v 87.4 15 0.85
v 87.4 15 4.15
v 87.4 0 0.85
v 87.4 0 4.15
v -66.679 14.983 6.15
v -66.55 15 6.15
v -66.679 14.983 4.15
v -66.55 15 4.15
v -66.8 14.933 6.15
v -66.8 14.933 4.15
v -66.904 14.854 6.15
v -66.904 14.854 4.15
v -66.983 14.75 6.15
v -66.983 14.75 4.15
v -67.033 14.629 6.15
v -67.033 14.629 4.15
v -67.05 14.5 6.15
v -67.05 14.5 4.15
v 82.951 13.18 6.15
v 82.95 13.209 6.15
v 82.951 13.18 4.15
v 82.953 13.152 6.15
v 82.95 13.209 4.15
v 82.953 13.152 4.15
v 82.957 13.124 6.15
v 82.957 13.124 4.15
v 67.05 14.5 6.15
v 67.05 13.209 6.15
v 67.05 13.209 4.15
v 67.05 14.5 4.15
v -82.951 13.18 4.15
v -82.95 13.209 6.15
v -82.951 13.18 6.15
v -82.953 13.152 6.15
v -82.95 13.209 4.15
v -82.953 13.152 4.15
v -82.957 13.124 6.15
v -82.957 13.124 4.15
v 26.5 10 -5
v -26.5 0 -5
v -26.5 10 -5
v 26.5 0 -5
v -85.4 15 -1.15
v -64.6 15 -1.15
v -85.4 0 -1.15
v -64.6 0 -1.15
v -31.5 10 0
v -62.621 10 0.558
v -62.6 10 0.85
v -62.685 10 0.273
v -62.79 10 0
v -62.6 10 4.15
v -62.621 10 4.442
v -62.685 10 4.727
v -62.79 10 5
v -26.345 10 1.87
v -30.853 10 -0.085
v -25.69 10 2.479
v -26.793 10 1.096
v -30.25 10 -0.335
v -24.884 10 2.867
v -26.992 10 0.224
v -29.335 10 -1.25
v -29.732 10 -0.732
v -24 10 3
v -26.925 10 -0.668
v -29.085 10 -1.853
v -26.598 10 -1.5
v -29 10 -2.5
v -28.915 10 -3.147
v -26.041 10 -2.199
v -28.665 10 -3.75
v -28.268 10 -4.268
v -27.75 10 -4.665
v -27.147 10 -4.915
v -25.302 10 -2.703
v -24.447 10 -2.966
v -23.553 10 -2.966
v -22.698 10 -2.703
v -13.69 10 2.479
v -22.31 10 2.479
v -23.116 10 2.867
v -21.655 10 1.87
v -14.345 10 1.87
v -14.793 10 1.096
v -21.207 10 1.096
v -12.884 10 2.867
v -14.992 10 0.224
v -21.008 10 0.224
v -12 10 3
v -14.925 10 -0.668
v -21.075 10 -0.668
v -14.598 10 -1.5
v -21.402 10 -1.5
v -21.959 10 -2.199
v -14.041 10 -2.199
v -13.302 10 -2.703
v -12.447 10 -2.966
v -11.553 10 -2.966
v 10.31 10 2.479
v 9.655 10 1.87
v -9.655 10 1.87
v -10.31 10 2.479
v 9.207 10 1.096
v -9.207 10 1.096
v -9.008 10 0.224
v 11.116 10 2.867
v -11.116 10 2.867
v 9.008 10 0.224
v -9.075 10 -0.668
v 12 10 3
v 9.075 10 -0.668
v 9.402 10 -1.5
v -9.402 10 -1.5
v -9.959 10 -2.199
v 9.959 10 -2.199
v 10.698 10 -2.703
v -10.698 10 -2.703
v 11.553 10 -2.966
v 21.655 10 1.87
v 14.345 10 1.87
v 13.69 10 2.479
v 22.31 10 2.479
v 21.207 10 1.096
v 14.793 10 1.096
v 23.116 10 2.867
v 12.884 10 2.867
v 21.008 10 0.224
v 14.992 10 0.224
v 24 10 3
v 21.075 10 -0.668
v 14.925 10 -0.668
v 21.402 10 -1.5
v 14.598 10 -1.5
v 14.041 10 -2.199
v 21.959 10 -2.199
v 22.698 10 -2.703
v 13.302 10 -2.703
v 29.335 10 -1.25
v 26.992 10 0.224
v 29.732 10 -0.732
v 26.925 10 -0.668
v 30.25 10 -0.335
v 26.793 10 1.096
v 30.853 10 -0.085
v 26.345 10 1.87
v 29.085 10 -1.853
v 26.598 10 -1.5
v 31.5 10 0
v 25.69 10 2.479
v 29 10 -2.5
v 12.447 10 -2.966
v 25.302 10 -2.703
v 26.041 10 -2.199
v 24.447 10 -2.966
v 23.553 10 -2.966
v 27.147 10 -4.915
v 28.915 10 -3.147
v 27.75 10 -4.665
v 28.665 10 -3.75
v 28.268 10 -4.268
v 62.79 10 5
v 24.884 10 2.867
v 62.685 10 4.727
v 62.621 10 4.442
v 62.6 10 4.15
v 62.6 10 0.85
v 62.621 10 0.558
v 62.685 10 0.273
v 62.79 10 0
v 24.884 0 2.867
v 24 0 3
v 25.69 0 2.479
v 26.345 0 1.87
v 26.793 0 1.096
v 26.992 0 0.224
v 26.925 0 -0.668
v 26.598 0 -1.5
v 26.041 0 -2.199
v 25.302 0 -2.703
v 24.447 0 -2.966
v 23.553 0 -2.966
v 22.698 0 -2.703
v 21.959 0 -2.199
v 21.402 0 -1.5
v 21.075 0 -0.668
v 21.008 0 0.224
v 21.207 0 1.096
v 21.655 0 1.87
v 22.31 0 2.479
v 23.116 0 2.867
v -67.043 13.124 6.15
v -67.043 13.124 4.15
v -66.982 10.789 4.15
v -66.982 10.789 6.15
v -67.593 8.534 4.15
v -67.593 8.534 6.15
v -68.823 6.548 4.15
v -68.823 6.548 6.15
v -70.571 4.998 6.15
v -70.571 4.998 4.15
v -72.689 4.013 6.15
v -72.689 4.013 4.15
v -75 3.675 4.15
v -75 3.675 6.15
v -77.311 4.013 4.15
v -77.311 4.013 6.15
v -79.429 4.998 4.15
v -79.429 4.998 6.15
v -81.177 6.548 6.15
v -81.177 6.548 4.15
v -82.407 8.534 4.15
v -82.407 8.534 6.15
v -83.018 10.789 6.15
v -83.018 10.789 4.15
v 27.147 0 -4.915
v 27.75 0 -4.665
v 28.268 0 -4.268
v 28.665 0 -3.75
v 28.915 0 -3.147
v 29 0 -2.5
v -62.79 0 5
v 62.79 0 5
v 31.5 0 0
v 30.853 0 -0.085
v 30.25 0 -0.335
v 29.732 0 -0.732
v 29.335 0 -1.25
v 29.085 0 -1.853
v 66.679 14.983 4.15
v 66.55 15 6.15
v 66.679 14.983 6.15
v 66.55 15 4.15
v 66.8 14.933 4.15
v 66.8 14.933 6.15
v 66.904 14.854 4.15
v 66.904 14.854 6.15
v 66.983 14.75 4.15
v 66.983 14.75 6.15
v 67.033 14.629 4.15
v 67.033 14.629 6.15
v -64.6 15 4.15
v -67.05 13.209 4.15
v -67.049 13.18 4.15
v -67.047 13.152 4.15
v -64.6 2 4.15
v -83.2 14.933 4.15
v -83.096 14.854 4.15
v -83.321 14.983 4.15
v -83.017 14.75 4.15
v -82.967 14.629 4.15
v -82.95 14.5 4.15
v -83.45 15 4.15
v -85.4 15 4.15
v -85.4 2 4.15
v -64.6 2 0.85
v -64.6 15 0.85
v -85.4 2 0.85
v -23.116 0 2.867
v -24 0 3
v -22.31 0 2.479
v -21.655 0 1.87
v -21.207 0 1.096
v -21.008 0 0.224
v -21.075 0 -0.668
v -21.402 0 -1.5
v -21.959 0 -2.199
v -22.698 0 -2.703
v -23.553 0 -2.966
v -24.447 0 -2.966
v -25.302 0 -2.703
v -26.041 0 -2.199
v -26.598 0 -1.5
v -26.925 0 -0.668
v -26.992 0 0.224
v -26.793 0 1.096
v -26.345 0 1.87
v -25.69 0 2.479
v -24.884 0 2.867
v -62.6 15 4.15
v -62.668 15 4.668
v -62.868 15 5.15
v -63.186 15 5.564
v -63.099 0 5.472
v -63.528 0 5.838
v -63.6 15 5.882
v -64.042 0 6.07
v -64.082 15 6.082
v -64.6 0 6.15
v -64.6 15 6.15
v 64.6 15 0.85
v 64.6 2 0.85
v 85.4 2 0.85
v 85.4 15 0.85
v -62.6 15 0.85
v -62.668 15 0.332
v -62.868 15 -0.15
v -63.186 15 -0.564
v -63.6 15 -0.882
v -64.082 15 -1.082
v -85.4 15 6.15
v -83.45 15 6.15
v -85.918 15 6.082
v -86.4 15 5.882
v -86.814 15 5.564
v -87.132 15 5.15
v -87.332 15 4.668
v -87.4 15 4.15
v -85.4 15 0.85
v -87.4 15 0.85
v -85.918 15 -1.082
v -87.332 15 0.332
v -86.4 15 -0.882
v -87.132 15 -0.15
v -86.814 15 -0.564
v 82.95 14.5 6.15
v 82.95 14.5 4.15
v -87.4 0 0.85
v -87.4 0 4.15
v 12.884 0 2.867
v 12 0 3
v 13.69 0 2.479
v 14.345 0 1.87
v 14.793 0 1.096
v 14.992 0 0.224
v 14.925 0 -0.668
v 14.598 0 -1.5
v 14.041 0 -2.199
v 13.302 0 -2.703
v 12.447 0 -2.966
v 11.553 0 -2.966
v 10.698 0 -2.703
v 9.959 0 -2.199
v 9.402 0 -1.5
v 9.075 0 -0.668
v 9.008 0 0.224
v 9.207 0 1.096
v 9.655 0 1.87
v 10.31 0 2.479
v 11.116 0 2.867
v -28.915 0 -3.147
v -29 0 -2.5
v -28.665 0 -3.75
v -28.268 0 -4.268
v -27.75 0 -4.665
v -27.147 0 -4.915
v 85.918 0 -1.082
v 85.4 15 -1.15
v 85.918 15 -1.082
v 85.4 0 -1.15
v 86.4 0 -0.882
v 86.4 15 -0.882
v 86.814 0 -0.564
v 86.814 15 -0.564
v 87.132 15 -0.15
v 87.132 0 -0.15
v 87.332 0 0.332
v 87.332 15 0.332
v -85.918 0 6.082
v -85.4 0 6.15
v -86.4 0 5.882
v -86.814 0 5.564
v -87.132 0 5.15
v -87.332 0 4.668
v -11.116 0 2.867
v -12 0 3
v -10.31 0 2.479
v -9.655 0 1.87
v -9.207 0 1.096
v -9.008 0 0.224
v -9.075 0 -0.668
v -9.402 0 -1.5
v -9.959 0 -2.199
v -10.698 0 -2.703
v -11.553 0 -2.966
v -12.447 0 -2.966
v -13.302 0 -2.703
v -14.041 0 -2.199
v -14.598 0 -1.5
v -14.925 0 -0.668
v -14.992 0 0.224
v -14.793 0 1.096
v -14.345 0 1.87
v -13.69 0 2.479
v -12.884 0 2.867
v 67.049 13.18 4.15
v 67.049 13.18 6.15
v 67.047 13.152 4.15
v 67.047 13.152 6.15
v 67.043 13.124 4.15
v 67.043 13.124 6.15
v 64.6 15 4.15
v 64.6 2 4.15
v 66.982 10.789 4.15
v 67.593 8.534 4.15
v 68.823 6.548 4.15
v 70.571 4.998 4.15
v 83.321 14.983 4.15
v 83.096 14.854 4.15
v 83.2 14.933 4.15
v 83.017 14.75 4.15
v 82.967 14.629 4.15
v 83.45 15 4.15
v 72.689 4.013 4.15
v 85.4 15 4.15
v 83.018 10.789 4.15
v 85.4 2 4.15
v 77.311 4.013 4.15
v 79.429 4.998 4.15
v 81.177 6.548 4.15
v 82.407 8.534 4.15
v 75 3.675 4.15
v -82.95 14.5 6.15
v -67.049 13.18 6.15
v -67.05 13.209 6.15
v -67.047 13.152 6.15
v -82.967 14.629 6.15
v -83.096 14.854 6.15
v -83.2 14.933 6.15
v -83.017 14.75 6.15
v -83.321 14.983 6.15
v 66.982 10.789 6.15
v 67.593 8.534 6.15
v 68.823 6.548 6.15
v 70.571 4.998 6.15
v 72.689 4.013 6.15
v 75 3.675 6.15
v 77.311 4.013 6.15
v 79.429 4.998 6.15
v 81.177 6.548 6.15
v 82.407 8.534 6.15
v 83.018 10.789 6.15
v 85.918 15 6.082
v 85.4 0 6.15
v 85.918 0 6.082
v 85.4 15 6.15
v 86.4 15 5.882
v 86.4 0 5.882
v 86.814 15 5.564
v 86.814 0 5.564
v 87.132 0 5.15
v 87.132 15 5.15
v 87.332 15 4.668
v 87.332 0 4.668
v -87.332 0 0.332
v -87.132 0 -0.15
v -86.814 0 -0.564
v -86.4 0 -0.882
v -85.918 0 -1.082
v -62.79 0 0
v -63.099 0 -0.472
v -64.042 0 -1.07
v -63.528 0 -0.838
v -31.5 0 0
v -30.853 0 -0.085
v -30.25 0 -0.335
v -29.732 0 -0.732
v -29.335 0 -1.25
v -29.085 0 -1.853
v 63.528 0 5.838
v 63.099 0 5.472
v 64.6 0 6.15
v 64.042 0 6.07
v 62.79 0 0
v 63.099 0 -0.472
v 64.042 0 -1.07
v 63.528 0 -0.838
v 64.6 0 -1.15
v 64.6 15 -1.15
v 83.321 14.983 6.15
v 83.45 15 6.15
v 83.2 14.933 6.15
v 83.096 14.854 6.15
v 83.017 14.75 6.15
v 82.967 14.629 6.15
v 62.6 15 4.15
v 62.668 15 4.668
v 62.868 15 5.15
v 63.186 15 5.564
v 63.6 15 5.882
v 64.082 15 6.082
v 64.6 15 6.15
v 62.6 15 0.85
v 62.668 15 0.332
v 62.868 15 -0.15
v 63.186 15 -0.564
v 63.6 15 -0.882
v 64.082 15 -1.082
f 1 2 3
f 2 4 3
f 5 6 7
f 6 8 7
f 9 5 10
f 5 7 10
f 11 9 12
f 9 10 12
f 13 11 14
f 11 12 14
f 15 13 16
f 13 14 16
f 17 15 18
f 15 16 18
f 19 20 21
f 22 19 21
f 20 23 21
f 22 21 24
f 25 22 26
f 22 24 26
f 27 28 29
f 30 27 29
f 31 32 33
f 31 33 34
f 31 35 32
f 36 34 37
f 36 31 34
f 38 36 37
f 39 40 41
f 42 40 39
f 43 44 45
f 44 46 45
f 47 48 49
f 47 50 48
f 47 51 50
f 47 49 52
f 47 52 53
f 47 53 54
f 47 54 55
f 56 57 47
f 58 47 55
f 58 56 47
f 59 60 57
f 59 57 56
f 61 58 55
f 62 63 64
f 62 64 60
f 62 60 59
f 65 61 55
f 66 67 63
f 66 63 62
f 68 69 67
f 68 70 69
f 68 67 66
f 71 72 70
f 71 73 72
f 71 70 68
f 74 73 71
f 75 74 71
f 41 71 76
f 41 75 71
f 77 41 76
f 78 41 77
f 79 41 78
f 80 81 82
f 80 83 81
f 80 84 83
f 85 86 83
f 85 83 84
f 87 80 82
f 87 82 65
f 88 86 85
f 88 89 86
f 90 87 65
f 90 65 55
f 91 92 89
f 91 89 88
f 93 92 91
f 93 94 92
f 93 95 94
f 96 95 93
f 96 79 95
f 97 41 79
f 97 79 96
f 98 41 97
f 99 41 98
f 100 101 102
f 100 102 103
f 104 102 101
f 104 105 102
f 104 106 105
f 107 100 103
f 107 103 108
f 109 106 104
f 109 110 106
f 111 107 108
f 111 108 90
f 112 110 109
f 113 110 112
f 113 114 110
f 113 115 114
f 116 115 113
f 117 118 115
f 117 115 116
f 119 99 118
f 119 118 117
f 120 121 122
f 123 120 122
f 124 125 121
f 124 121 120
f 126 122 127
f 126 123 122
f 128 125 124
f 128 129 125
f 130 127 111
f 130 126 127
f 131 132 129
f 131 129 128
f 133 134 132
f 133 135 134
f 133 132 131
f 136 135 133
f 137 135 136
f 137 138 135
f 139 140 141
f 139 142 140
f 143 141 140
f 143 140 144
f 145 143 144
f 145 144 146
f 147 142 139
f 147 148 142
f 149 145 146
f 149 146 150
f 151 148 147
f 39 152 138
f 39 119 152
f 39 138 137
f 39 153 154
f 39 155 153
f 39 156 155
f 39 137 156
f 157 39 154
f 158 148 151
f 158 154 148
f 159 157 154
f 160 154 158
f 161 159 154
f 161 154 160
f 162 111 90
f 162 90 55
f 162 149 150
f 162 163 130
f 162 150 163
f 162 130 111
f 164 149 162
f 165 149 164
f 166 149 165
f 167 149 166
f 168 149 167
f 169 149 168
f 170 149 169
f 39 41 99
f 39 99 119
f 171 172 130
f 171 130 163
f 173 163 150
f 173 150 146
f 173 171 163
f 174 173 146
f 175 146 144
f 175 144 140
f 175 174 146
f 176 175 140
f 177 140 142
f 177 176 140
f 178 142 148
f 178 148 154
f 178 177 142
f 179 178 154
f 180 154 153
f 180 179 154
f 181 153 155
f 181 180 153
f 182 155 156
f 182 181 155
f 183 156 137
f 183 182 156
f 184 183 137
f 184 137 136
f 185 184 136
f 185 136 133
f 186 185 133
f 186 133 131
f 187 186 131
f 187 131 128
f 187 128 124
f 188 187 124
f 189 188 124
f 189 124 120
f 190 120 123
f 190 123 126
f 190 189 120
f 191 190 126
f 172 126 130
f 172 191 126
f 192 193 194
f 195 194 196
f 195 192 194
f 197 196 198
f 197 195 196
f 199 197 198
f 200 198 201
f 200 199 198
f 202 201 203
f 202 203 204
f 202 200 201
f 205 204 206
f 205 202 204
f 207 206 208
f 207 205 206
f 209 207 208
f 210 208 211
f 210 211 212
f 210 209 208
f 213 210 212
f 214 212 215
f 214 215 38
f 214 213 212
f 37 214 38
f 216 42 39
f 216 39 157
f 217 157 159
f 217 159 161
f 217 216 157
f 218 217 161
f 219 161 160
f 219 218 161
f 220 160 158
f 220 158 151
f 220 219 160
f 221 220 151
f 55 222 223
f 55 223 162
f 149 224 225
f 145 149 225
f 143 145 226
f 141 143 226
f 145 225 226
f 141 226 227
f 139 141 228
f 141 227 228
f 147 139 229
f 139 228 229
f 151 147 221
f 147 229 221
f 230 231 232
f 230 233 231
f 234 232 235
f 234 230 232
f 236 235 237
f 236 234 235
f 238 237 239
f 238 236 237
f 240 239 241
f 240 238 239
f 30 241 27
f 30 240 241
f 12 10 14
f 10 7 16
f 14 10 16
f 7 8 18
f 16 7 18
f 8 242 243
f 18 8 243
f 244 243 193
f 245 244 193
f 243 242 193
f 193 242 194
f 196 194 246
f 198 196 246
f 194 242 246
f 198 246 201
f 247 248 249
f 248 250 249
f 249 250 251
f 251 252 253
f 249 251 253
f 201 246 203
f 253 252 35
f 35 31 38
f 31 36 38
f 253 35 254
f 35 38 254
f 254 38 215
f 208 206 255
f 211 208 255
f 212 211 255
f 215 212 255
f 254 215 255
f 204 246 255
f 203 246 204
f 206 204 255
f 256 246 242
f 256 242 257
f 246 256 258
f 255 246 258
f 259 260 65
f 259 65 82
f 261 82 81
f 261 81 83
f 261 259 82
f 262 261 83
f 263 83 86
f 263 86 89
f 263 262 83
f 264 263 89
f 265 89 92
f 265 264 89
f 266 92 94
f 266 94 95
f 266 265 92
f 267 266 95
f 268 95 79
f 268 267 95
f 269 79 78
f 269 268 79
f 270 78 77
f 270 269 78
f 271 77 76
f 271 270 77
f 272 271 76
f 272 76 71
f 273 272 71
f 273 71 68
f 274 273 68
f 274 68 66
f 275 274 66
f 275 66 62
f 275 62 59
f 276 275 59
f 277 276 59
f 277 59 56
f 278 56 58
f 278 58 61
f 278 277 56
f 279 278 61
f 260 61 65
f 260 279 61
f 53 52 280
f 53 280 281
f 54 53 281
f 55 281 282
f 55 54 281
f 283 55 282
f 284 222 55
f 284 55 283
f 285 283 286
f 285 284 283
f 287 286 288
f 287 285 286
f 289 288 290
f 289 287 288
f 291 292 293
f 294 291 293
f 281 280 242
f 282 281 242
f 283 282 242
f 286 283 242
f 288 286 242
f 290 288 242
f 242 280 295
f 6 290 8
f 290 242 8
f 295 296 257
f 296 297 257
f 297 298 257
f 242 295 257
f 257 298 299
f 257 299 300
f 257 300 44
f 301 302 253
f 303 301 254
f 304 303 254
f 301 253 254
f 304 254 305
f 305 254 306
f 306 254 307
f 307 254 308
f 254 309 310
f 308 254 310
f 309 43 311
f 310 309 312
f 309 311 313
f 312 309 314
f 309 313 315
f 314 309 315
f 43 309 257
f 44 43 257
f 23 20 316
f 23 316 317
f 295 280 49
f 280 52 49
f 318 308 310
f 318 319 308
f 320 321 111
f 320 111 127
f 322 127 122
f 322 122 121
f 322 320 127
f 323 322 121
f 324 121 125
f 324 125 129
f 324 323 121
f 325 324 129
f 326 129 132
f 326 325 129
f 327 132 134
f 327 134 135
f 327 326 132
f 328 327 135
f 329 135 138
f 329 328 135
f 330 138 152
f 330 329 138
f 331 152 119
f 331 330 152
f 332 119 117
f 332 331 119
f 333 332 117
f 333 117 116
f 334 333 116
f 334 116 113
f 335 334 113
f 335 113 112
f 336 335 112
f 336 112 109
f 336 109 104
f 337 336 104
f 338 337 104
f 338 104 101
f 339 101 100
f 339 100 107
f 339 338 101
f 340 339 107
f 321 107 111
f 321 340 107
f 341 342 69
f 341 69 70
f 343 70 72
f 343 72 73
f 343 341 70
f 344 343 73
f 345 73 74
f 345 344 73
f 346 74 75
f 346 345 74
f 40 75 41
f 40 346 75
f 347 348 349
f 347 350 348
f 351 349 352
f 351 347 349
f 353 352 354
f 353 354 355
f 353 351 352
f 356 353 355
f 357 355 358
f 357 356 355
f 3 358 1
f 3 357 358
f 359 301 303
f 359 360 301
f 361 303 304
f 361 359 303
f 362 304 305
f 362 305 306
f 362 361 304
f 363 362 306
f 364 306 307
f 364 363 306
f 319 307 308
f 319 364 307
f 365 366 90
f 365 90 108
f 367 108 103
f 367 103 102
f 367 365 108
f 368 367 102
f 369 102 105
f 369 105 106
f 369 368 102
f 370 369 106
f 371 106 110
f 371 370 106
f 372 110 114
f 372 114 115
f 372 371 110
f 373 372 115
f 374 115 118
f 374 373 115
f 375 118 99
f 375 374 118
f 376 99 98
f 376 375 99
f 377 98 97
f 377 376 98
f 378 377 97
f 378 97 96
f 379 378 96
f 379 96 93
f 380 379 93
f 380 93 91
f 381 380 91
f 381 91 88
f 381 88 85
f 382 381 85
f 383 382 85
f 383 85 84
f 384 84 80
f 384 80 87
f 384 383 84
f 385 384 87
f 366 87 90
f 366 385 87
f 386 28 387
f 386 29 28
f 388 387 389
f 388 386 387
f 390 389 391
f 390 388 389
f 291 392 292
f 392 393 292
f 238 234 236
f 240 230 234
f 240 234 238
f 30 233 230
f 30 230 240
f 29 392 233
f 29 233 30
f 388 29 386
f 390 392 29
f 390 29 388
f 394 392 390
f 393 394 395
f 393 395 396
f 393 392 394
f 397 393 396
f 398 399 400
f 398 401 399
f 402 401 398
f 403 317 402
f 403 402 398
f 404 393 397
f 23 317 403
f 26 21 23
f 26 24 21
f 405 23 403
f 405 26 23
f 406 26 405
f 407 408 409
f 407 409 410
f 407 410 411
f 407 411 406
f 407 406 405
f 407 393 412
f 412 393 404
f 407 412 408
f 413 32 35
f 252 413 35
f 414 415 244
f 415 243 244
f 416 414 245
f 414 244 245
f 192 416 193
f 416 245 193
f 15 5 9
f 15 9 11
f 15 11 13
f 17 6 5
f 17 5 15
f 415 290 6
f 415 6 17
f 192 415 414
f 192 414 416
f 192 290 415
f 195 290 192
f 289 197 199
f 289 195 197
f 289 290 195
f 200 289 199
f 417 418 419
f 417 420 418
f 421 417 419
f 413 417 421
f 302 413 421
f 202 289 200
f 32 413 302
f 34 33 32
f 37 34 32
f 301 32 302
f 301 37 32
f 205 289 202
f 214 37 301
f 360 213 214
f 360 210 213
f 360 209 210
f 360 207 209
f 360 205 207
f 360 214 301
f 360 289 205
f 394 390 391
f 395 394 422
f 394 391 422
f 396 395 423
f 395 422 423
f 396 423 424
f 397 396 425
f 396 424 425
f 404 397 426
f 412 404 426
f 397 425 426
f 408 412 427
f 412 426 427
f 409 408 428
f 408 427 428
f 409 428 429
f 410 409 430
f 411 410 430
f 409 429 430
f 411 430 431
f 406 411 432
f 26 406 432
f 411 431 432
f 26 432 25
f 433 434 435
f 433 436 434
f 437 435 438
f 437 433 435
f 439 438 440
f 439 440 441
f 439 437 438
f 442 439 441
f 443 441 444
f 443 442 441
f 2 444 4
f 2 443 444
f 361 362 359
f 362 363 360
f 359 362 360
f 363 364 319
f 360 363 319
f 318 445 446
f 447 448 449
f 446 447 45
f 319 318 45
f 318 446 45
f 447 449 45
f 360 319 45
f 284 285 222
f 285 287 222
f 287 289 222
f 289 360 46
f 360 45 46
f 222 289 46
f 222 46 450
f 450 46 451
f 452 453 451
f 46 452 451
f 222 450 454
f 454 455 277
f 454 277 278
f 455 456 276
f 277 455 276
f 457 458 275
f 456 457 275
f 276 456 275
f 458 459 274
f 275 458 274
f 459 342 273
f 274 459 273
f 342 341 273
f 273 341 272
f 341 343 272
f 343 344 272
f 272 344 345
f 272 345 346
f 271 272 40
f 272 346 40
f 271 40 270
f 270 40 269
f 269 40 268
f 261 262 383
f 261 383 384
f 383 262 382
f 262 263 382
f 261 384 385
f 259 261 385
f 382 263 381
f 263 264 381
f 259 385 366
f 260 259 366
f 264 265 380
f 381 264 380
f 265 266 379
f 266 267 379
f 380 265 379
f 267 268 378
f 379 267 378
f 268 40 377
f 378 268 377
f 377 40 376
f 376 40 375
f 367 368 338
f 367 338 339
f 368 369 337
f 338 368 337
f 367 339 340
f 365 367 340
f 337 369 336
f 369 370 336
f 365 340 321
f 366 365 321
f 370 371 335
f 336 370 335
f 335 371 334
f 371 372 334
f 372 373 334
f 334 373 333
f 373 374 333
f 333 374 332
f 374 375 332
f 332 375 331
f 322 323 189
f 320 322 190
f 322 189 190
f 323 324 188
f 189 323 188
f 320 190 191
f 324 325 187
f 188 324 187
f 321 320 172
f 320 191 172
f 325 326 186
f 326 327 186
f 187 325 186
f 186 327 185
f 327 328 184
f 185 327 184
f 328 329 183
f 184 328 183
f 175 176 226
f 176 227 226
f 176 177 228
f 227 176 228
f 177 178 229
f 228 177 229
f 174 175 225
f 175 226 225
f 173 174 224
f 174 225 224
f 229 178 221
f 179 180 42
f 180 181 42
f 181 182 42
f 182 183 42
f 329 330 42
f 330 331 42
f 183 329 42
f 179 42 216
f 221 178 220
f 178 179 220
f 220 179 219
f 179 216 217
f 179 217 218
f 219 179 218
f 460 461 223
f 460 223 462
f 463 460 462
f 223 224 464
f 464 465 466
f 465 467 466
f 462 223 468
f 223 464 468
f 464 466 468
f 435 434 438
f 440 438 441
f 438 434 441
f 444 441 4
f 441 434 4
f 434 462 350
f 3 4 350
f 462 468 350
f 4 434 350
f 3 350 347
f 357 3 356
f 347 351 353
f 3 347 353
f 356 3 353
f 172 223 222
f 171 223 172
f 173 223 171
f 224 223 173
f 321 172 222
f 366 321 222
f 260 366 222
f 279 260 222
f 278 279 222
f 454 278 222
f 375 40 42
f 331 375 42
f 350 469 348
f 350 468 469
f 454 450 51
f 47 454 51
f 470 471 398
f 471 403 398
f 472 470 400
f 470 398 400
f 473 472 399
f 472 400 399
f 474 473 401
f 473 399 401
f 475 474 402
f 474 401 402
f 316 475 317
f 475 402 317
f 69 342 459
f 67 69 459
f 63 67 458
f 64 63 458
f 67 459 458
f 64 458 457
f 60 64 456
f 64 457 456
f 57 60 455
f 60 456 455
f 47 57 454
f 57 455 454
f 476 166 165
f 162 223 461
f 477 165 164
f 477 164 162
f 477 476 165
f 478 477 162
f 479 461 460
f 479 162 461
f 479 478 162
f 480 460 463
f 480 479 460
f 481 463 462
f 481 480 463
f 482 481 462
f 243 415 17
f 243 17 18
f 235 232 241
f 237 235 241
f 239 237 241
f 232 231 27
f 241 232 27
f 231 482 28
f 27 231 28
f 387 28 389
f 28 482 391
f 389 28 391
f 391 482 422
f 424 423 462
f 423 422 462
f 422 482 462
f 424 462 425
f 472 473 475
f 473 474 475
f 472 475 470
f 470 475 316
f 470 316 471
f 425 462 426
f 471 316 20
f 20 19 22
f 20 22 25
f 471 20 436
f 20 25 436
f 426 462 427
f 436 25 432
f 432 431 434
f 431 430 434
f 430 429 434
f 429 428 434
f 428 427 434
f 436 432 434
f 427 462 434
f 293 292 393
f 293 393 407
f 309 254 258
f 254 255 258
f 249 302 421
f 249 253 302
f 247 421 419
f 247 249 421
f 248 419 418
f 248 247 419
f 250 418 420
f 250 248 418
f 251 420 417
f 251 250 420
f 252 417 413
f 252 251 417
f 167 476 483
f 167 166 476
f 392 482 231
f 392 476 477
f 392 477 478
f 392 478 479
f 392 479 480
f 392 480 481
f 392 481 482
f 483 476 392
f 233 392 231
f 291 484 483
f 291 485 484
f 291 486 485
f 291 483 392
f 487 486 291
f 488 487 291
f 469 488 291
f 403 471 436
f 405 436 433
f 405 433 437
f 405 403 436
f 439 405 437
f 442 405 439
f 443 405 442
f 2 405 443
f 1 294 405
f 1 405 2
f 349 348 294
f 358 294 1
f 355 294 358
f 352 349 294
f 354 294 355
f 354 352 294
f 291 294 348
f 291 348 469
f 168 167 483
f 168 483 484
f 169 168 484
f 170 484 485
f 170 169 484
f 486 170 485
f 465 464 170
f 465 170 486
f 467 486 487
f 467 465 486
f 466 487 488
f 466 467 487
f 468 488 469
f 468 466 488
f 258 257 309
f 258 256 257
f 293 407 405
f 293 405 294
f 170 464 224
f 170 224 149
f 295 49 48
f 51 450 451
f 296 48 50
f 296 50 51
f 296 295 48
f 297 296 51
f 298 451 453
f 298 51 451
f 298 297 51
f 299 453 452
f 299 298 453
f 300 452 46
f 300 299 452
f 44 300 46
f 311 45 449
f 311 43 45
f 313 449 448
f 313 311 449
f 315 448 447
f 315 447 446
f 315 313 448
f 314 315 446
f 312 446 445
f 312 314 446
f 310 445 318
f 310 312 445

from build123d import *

# Parameters (mm, degrees)
SKIZZE1_W                                   = 29
SKIZZE1_H                                   = 10
SKIZZE1_R                                   = 3
AUFSATZ_LINEAR_AUSTRAGEN1_DEPTH             = 10
SKIZZE2_W                                   = 5
SKIZZE2_H                                   = 10
AUFSATZ_LINEAR_AUSTRAGEN2_DEPTH             = 57.25
SKIZZE3_W                                   = 20.8
SKIZZE3_H                                   = 3.3
SCHNITT_LINEAR_AUSTRAGEN1_DEPTH             = 8
AUFSATZ_LINEAR_AUSTRAGEN3_REACH             = 88.972
SKIZZE5_W                                   = 24.8
SKIZZE5_H                                   = 7.3
SKIZZE5_W_2                                 = 20.8
SKIZZE5_H_2                                 = 3.3
AUFSATZ_LINEAR_AUSTRAGEN3_DIRECTION_2_DEPTH = 5
SCHNITT_LINEAR_AUSTRAGEN2_REACH             = 91.376
SKIZZE4_R                                   = 8.075
SCHNITT_LINEAR_START                        = -1.834682
SKIZZE7_W                                   = 15.9
SKIZZE7_H                                   = 2
SCHNITT_LINEAR_AUSTRAGEN3_DEPTH             = 1.834682
VERRUNDUNG1_R                               = 2
VERRUNDUNG3_R                               = 0.5
VERRUNDUNG1_OF_SPIEGELN1_R                  = 2
VERRUNDUNG3_OF_SPIEGELN1_R                  = 0.5
VERRUNDUNG2_START                           = -1
VERRUNDUNG2_DEPTH                           = 12
VERRUNDUNG2_2_DEPTH                         = 10


with BuildPart() as part:
    # Skizze1 → Aufsatz-Linear austragen1 (new body)
    # profile 1 of 2: a face of its own
    with BuildSketch(Plane(origin=(0, 0, 0), x_dir=(1, 0, 0), z_dir=(0, 1, 0))):
        with Locations((-14.5, 0)):
            Rectangle(SKIZZE1_W, SKIZZE1_H)
        with Locations(Location((-24, 0, 0), (0, 0, 270))):
            Circle(SKIZZE1_R, mode=Mode.SUBTRACT)
        with Locations(Location((-12, 0, 0), (0, 0, 270))):
            Circle(SKIZZE1_R, mode=Mode.SUBTRACT)
    # profile 2 of 2: a face of its own
    with BuildSketch(Plane(origin=(0, 0, 0), x_dir=(1, 0, 0), z_dir=(0, 1, 0))):
        with Locations((14.5, 0)):
            Rectangle(SKIZZE1_W, SKIZZE1_H)
        with Locations(Location((12, 0, 0), (0, 0, 270))):
            Circle(SKIZZE1_R, mode=Mode.SUBTRACT)
        with Locations(Location((24, 0, 0), (0, 0, 270))):
            Circle(SKIZZE1_R, mode=Mode.SUBTRACT)
    extrude(amount=AUFSATZ_LINEAR_AUSTRAGEN1_DEPTH)

    # Skizze2 → Aufsatz-Linear austragen2 (add)
    with BuildSketch(Plane(origin=(29, 0, 0), x_dir=(0, 0, -1), z_dir=(1, 0, 0))):
        with Locations((-2.5, 5)):
            Rectangle(SKIZZE2_W, SKIZZE2_H)
    aufsatz_linear_austragen2 = extrude(amount=AUFSATZ_LINEAR_AUSTRAGEN2_DEPTH)

    # Skizze3 → Schnitt-Linear austragen1 (cut)
    with BuildSketch(Plane(origin=(0, 10, 0), x_dir=(1, 0, 0), z_dir=(0, 1, 0))):
        with Locations((75, -2.5)):
            Rectangle(SKIZZE3_W, SKIZZE3_H)
    schnitt_linear_austragen1 = extrude(amount=-SCHNITT_LINEAR_AUSTRAGEN1_DEPTH, mode=Mode.SUBTRACT)

    # Aufsatz-Linear austragen3: up to this face of the body (flat: up to its plane)
    aufsatz_linear_austragen3_end = Plane(part.part.faces().sort_by_distance((28.625, 0, 3.84316974))[0])
    # Skizze5 → Aufsatz-Linear austragen3 (add, up to the picked face)
    with BuildSketch(Plane(origin=(0, 10, 0), x_dir=(1, 0, 0), z_dir=(0, 1, 0)), mode=Mode.PRIVATE) as aufsatz_linear_austragen3_sk1:
        with Locations((75, -2.5)):
            Rectangle(SKIZZE5_W, SKIZZE5_H)
        with Locations((75, -2.5)):
            Rectangle(SKIZZE5_W_2, SKIZZE5_H_2, mode=Mode.SUBTRACT)
    aufsatz_linear_austragen3_tool1 = split(extrude(aufsatz_linear_austragen3_sk1.sketch, amount=-AUFSATZ_LINEAR_AUSTRAGEN3_REACH, mode=Mode.PRIVATE), bisect_by=aufsatz_linear_austragen3_end, keep=Keep.BOTH, mode=Mode.PRIVATE)
    aufsatz_linear_austragen3 = aufsatz_linear_austragen3_tool1.solids().sort_by(Axis((75, 10, 5.891479), (0, -1, 0)))[0]
    add(aufsatz_linear_austragen3)

    # Skizze5 → Aufsatz-Linear austragen3 direction 2 (add)
    with BuildSketch(Plane(origin=(0, 10, 0), x_dir=(1, 0, 0), z_dir=(0, 1, 0))):
        with Locations((75, -2.5)):
            Rectangle(SKIZZE5_W, SKIZZE5_H)
        with Locations((75, -2.5)):
            Rectangle(SKIZZE5_W_2, SKIZZE5_H_2, mode=Mode.SUBTRACT)
    aufsatz_linear_austragen3_direction_2 = extrude(amount=AUFSATZ_LINEAR_AUSTRAGEN3_DIRECTION_2_DEPTH)

    # Skizze4 → Schnitt-Linear austragen2 (cut, up to next)
    with BuildSketch(Plane.XY.offset(6.15), mode=Mode.PRIVATE) as schnitt_linear_austragen2_sk1:
        with Locations((75, 11.75)):
            Circle(SKIZZE4_R)
    schnitt_linear_austragen2_tool1 = extrude(schnitt_linear_austragen2_sk1.sketch, amount=-SCHNITT_LINEAR_AUSTRAGEN2_REACH, mode=Mode.PRIVATE) & part.part
    schnitt_linear_austragen2 = schnitt_linear_austragen2_tool1.solids().sort_by_distance((75, 11.75, 6.15))[0]
    add(schnitt_linear_austragen2, mode=Mode.SUBTRACT)

    # Skizze7 → Schnitt-Linear austragen3 (cut)
    with BuildSketch(Plane(origin=(0, 15, 0), x_dir=(1, 0, 0), z_dir=(0, 1, 0)).offset(SCHNITT_LINEAR_START)):
        with Locations((75, -5.15)):
            Rectangle(SKIZZE7_W, SKIZZE7_H)
    schnitt_linear_austragen3 = extrude(amount=SCHNITT_LINEAR_AUSTRAGEN3_DEPTH, mode=Mode.SUBTRACT)

    # Verrundung1
    verrundung1_edges = [part.edges().sort_by_distance(p)[0] for p in [
        (87.4, 7.5, 6.15),
        (87.4, 7.5, -1.15),
        (62.6, 7.5, 6.15),
        (62.6, 7.5, -1.15),
    ]]
    fillet(verrundung1_edges, radius=VERRUNDUNG1_R)

    # Verrundung3
    verrundung3_edges = [part.edges().sort_by_distance(p)[0] for p in [
        (82.95, 15, 5.15),
        (82.95, 13.165318, 5.15),
        (67.05, 15, 5.15),
        (67.05, 13.165318, 5.15),
    ]]
    fillet(verrundung3_edges, radius=VERRUNDUNG3_R)

    # Spiegeln1: Aufsatz-Linear austragen2, Schnitt-Linear austragen1, Aufsatz-Linear austragen3, Aufsatz-Linear austragen3 direction 2, Schnitt-Linear austragen2, Schnitt-Linear austragen3 across plane
    add(aufsatz_linear_austragen2.mirror(Plane(origin=(0, 0, 0), x_dir=(0, 0, 1), z_dir=(1, 0, 0))))
    add(schnitt_linear_austragen1.mirror(Plane(origin=(0, 0, 0), x_dir=(0, 0, 1), z_dir=(1, 0, 0))), mode=Mode.SUBTRACT)
    add(aufsatz_linear_austragen3.mirror(Plane(origin=(0, 0, 0), x_dir=(0, 0, 1), z_dir=(1, 0, 0))))
    add(aufsatz_linear_austragen3_direction_2.mirror(Plane(origin=(0, 0, 0), x_dir=(0, 0, 1), z_dir=(1, 0, 0))))
    add(schnitt_linear_austragen2.mirror(Plane(origin=(0, 0, 0), x_dir=(0, 0, 1), z_dir=(1, 0, 0))), mode=Mode.SUBTRACT)
    add(schnitt_linear_austragen3.mirror(Plane(origin=(0, 0, 0), x_dir=(0, 0, 1), z_dir=(1, 0, 0))), mode=Mode.SUBTRACT)

    # Verrundung1 of Spiegeln1
    verrundung1_of_spiegeln1_edges = [part.edges().sort_by_distance(p)[0] for p in [
        (-87.4, 7.5, 6.15),
        (-87.4, 7.5, -1.15),
        (-62.6, 7.5, 6.15),
        (-62.6, 7.5, -1.15),
    ]]
    fillet(verrundung1_of_spiegeln1_edges, radius=VERRUNDUNG1_OF_SPIEGELN1_R)

    # Verrundung3 of Spiegeln1
    verrundung3_of_spiegeln1_edges = [part.edges().sort_by_distance(p)[0] for p in [
        (-82.95, 15, 5.15),
        (-82.95, 13.165318, 5.15),
        (-67.05, 15, 5.15),
        (-67.05, 13.165318, 5.15),
    ]]
    fillet(verrundung3_of_spiegeln1_edges, radius=VERRUNDUNG3_OF_SPIEGELN1_R)

    # Verrundung2: read off the stored shape, not the designer's step
    # Verrundung2 outline → Verrundung2 (cut)
    with BuildSketch(Plane(origin=(0, 0, 0), x_dir=(1, 0, 0), z_dir=(0, 1, 0)).offset(VERRUNDUNG2_START)):
        with BuildLine():
            ThreePointArc((-29, 2.5), (-28.267766953, 4.267766953), (-26.5, 5))
            Line((-26.5, 5), (-29, 5))
            Line((-29, 5), (-29, 2.5))
        make_face()
        with BuildLine():
            ThreePointArc((26.5, 5), (28.267766953, 4.267766953), (29, 2.5))
            Line((29, 2.5), (29, 5))
            Line((29, 5), (26.5, 5))
        make_face()
    extrude(amount=VERRUNDUNG2_DEPTH, mode=Mode.SUBTRACT)

    # Verrundung2 2 outline → Verrundung2 2 (add)
    with BuildSketch(Plane(origin=(0, 0, 0), x_dir=(1, 0, 0), z_dir=(0, 1, 0))):
        with BuildLine():
            Line((-29, 0), (-29, 2.5))
            ThreePointArc((-29, 2.5), (-29.732233047, 0.732233047), (-31.5, 0))
            Line((-31.5, 0), (-29, 0))
        make_face()
        with BuildLine():
            ThreePointArc((31.5, 0), (29.732233047, 0.732233047), (29, 2.5))
            Line((29, 2.5), (29, 0))
            Line((29, 0), (31.5, 0))
        make_face()
    extrude(amount=VERRUNDUNG2_2_DEPTH)


solid = part.part
